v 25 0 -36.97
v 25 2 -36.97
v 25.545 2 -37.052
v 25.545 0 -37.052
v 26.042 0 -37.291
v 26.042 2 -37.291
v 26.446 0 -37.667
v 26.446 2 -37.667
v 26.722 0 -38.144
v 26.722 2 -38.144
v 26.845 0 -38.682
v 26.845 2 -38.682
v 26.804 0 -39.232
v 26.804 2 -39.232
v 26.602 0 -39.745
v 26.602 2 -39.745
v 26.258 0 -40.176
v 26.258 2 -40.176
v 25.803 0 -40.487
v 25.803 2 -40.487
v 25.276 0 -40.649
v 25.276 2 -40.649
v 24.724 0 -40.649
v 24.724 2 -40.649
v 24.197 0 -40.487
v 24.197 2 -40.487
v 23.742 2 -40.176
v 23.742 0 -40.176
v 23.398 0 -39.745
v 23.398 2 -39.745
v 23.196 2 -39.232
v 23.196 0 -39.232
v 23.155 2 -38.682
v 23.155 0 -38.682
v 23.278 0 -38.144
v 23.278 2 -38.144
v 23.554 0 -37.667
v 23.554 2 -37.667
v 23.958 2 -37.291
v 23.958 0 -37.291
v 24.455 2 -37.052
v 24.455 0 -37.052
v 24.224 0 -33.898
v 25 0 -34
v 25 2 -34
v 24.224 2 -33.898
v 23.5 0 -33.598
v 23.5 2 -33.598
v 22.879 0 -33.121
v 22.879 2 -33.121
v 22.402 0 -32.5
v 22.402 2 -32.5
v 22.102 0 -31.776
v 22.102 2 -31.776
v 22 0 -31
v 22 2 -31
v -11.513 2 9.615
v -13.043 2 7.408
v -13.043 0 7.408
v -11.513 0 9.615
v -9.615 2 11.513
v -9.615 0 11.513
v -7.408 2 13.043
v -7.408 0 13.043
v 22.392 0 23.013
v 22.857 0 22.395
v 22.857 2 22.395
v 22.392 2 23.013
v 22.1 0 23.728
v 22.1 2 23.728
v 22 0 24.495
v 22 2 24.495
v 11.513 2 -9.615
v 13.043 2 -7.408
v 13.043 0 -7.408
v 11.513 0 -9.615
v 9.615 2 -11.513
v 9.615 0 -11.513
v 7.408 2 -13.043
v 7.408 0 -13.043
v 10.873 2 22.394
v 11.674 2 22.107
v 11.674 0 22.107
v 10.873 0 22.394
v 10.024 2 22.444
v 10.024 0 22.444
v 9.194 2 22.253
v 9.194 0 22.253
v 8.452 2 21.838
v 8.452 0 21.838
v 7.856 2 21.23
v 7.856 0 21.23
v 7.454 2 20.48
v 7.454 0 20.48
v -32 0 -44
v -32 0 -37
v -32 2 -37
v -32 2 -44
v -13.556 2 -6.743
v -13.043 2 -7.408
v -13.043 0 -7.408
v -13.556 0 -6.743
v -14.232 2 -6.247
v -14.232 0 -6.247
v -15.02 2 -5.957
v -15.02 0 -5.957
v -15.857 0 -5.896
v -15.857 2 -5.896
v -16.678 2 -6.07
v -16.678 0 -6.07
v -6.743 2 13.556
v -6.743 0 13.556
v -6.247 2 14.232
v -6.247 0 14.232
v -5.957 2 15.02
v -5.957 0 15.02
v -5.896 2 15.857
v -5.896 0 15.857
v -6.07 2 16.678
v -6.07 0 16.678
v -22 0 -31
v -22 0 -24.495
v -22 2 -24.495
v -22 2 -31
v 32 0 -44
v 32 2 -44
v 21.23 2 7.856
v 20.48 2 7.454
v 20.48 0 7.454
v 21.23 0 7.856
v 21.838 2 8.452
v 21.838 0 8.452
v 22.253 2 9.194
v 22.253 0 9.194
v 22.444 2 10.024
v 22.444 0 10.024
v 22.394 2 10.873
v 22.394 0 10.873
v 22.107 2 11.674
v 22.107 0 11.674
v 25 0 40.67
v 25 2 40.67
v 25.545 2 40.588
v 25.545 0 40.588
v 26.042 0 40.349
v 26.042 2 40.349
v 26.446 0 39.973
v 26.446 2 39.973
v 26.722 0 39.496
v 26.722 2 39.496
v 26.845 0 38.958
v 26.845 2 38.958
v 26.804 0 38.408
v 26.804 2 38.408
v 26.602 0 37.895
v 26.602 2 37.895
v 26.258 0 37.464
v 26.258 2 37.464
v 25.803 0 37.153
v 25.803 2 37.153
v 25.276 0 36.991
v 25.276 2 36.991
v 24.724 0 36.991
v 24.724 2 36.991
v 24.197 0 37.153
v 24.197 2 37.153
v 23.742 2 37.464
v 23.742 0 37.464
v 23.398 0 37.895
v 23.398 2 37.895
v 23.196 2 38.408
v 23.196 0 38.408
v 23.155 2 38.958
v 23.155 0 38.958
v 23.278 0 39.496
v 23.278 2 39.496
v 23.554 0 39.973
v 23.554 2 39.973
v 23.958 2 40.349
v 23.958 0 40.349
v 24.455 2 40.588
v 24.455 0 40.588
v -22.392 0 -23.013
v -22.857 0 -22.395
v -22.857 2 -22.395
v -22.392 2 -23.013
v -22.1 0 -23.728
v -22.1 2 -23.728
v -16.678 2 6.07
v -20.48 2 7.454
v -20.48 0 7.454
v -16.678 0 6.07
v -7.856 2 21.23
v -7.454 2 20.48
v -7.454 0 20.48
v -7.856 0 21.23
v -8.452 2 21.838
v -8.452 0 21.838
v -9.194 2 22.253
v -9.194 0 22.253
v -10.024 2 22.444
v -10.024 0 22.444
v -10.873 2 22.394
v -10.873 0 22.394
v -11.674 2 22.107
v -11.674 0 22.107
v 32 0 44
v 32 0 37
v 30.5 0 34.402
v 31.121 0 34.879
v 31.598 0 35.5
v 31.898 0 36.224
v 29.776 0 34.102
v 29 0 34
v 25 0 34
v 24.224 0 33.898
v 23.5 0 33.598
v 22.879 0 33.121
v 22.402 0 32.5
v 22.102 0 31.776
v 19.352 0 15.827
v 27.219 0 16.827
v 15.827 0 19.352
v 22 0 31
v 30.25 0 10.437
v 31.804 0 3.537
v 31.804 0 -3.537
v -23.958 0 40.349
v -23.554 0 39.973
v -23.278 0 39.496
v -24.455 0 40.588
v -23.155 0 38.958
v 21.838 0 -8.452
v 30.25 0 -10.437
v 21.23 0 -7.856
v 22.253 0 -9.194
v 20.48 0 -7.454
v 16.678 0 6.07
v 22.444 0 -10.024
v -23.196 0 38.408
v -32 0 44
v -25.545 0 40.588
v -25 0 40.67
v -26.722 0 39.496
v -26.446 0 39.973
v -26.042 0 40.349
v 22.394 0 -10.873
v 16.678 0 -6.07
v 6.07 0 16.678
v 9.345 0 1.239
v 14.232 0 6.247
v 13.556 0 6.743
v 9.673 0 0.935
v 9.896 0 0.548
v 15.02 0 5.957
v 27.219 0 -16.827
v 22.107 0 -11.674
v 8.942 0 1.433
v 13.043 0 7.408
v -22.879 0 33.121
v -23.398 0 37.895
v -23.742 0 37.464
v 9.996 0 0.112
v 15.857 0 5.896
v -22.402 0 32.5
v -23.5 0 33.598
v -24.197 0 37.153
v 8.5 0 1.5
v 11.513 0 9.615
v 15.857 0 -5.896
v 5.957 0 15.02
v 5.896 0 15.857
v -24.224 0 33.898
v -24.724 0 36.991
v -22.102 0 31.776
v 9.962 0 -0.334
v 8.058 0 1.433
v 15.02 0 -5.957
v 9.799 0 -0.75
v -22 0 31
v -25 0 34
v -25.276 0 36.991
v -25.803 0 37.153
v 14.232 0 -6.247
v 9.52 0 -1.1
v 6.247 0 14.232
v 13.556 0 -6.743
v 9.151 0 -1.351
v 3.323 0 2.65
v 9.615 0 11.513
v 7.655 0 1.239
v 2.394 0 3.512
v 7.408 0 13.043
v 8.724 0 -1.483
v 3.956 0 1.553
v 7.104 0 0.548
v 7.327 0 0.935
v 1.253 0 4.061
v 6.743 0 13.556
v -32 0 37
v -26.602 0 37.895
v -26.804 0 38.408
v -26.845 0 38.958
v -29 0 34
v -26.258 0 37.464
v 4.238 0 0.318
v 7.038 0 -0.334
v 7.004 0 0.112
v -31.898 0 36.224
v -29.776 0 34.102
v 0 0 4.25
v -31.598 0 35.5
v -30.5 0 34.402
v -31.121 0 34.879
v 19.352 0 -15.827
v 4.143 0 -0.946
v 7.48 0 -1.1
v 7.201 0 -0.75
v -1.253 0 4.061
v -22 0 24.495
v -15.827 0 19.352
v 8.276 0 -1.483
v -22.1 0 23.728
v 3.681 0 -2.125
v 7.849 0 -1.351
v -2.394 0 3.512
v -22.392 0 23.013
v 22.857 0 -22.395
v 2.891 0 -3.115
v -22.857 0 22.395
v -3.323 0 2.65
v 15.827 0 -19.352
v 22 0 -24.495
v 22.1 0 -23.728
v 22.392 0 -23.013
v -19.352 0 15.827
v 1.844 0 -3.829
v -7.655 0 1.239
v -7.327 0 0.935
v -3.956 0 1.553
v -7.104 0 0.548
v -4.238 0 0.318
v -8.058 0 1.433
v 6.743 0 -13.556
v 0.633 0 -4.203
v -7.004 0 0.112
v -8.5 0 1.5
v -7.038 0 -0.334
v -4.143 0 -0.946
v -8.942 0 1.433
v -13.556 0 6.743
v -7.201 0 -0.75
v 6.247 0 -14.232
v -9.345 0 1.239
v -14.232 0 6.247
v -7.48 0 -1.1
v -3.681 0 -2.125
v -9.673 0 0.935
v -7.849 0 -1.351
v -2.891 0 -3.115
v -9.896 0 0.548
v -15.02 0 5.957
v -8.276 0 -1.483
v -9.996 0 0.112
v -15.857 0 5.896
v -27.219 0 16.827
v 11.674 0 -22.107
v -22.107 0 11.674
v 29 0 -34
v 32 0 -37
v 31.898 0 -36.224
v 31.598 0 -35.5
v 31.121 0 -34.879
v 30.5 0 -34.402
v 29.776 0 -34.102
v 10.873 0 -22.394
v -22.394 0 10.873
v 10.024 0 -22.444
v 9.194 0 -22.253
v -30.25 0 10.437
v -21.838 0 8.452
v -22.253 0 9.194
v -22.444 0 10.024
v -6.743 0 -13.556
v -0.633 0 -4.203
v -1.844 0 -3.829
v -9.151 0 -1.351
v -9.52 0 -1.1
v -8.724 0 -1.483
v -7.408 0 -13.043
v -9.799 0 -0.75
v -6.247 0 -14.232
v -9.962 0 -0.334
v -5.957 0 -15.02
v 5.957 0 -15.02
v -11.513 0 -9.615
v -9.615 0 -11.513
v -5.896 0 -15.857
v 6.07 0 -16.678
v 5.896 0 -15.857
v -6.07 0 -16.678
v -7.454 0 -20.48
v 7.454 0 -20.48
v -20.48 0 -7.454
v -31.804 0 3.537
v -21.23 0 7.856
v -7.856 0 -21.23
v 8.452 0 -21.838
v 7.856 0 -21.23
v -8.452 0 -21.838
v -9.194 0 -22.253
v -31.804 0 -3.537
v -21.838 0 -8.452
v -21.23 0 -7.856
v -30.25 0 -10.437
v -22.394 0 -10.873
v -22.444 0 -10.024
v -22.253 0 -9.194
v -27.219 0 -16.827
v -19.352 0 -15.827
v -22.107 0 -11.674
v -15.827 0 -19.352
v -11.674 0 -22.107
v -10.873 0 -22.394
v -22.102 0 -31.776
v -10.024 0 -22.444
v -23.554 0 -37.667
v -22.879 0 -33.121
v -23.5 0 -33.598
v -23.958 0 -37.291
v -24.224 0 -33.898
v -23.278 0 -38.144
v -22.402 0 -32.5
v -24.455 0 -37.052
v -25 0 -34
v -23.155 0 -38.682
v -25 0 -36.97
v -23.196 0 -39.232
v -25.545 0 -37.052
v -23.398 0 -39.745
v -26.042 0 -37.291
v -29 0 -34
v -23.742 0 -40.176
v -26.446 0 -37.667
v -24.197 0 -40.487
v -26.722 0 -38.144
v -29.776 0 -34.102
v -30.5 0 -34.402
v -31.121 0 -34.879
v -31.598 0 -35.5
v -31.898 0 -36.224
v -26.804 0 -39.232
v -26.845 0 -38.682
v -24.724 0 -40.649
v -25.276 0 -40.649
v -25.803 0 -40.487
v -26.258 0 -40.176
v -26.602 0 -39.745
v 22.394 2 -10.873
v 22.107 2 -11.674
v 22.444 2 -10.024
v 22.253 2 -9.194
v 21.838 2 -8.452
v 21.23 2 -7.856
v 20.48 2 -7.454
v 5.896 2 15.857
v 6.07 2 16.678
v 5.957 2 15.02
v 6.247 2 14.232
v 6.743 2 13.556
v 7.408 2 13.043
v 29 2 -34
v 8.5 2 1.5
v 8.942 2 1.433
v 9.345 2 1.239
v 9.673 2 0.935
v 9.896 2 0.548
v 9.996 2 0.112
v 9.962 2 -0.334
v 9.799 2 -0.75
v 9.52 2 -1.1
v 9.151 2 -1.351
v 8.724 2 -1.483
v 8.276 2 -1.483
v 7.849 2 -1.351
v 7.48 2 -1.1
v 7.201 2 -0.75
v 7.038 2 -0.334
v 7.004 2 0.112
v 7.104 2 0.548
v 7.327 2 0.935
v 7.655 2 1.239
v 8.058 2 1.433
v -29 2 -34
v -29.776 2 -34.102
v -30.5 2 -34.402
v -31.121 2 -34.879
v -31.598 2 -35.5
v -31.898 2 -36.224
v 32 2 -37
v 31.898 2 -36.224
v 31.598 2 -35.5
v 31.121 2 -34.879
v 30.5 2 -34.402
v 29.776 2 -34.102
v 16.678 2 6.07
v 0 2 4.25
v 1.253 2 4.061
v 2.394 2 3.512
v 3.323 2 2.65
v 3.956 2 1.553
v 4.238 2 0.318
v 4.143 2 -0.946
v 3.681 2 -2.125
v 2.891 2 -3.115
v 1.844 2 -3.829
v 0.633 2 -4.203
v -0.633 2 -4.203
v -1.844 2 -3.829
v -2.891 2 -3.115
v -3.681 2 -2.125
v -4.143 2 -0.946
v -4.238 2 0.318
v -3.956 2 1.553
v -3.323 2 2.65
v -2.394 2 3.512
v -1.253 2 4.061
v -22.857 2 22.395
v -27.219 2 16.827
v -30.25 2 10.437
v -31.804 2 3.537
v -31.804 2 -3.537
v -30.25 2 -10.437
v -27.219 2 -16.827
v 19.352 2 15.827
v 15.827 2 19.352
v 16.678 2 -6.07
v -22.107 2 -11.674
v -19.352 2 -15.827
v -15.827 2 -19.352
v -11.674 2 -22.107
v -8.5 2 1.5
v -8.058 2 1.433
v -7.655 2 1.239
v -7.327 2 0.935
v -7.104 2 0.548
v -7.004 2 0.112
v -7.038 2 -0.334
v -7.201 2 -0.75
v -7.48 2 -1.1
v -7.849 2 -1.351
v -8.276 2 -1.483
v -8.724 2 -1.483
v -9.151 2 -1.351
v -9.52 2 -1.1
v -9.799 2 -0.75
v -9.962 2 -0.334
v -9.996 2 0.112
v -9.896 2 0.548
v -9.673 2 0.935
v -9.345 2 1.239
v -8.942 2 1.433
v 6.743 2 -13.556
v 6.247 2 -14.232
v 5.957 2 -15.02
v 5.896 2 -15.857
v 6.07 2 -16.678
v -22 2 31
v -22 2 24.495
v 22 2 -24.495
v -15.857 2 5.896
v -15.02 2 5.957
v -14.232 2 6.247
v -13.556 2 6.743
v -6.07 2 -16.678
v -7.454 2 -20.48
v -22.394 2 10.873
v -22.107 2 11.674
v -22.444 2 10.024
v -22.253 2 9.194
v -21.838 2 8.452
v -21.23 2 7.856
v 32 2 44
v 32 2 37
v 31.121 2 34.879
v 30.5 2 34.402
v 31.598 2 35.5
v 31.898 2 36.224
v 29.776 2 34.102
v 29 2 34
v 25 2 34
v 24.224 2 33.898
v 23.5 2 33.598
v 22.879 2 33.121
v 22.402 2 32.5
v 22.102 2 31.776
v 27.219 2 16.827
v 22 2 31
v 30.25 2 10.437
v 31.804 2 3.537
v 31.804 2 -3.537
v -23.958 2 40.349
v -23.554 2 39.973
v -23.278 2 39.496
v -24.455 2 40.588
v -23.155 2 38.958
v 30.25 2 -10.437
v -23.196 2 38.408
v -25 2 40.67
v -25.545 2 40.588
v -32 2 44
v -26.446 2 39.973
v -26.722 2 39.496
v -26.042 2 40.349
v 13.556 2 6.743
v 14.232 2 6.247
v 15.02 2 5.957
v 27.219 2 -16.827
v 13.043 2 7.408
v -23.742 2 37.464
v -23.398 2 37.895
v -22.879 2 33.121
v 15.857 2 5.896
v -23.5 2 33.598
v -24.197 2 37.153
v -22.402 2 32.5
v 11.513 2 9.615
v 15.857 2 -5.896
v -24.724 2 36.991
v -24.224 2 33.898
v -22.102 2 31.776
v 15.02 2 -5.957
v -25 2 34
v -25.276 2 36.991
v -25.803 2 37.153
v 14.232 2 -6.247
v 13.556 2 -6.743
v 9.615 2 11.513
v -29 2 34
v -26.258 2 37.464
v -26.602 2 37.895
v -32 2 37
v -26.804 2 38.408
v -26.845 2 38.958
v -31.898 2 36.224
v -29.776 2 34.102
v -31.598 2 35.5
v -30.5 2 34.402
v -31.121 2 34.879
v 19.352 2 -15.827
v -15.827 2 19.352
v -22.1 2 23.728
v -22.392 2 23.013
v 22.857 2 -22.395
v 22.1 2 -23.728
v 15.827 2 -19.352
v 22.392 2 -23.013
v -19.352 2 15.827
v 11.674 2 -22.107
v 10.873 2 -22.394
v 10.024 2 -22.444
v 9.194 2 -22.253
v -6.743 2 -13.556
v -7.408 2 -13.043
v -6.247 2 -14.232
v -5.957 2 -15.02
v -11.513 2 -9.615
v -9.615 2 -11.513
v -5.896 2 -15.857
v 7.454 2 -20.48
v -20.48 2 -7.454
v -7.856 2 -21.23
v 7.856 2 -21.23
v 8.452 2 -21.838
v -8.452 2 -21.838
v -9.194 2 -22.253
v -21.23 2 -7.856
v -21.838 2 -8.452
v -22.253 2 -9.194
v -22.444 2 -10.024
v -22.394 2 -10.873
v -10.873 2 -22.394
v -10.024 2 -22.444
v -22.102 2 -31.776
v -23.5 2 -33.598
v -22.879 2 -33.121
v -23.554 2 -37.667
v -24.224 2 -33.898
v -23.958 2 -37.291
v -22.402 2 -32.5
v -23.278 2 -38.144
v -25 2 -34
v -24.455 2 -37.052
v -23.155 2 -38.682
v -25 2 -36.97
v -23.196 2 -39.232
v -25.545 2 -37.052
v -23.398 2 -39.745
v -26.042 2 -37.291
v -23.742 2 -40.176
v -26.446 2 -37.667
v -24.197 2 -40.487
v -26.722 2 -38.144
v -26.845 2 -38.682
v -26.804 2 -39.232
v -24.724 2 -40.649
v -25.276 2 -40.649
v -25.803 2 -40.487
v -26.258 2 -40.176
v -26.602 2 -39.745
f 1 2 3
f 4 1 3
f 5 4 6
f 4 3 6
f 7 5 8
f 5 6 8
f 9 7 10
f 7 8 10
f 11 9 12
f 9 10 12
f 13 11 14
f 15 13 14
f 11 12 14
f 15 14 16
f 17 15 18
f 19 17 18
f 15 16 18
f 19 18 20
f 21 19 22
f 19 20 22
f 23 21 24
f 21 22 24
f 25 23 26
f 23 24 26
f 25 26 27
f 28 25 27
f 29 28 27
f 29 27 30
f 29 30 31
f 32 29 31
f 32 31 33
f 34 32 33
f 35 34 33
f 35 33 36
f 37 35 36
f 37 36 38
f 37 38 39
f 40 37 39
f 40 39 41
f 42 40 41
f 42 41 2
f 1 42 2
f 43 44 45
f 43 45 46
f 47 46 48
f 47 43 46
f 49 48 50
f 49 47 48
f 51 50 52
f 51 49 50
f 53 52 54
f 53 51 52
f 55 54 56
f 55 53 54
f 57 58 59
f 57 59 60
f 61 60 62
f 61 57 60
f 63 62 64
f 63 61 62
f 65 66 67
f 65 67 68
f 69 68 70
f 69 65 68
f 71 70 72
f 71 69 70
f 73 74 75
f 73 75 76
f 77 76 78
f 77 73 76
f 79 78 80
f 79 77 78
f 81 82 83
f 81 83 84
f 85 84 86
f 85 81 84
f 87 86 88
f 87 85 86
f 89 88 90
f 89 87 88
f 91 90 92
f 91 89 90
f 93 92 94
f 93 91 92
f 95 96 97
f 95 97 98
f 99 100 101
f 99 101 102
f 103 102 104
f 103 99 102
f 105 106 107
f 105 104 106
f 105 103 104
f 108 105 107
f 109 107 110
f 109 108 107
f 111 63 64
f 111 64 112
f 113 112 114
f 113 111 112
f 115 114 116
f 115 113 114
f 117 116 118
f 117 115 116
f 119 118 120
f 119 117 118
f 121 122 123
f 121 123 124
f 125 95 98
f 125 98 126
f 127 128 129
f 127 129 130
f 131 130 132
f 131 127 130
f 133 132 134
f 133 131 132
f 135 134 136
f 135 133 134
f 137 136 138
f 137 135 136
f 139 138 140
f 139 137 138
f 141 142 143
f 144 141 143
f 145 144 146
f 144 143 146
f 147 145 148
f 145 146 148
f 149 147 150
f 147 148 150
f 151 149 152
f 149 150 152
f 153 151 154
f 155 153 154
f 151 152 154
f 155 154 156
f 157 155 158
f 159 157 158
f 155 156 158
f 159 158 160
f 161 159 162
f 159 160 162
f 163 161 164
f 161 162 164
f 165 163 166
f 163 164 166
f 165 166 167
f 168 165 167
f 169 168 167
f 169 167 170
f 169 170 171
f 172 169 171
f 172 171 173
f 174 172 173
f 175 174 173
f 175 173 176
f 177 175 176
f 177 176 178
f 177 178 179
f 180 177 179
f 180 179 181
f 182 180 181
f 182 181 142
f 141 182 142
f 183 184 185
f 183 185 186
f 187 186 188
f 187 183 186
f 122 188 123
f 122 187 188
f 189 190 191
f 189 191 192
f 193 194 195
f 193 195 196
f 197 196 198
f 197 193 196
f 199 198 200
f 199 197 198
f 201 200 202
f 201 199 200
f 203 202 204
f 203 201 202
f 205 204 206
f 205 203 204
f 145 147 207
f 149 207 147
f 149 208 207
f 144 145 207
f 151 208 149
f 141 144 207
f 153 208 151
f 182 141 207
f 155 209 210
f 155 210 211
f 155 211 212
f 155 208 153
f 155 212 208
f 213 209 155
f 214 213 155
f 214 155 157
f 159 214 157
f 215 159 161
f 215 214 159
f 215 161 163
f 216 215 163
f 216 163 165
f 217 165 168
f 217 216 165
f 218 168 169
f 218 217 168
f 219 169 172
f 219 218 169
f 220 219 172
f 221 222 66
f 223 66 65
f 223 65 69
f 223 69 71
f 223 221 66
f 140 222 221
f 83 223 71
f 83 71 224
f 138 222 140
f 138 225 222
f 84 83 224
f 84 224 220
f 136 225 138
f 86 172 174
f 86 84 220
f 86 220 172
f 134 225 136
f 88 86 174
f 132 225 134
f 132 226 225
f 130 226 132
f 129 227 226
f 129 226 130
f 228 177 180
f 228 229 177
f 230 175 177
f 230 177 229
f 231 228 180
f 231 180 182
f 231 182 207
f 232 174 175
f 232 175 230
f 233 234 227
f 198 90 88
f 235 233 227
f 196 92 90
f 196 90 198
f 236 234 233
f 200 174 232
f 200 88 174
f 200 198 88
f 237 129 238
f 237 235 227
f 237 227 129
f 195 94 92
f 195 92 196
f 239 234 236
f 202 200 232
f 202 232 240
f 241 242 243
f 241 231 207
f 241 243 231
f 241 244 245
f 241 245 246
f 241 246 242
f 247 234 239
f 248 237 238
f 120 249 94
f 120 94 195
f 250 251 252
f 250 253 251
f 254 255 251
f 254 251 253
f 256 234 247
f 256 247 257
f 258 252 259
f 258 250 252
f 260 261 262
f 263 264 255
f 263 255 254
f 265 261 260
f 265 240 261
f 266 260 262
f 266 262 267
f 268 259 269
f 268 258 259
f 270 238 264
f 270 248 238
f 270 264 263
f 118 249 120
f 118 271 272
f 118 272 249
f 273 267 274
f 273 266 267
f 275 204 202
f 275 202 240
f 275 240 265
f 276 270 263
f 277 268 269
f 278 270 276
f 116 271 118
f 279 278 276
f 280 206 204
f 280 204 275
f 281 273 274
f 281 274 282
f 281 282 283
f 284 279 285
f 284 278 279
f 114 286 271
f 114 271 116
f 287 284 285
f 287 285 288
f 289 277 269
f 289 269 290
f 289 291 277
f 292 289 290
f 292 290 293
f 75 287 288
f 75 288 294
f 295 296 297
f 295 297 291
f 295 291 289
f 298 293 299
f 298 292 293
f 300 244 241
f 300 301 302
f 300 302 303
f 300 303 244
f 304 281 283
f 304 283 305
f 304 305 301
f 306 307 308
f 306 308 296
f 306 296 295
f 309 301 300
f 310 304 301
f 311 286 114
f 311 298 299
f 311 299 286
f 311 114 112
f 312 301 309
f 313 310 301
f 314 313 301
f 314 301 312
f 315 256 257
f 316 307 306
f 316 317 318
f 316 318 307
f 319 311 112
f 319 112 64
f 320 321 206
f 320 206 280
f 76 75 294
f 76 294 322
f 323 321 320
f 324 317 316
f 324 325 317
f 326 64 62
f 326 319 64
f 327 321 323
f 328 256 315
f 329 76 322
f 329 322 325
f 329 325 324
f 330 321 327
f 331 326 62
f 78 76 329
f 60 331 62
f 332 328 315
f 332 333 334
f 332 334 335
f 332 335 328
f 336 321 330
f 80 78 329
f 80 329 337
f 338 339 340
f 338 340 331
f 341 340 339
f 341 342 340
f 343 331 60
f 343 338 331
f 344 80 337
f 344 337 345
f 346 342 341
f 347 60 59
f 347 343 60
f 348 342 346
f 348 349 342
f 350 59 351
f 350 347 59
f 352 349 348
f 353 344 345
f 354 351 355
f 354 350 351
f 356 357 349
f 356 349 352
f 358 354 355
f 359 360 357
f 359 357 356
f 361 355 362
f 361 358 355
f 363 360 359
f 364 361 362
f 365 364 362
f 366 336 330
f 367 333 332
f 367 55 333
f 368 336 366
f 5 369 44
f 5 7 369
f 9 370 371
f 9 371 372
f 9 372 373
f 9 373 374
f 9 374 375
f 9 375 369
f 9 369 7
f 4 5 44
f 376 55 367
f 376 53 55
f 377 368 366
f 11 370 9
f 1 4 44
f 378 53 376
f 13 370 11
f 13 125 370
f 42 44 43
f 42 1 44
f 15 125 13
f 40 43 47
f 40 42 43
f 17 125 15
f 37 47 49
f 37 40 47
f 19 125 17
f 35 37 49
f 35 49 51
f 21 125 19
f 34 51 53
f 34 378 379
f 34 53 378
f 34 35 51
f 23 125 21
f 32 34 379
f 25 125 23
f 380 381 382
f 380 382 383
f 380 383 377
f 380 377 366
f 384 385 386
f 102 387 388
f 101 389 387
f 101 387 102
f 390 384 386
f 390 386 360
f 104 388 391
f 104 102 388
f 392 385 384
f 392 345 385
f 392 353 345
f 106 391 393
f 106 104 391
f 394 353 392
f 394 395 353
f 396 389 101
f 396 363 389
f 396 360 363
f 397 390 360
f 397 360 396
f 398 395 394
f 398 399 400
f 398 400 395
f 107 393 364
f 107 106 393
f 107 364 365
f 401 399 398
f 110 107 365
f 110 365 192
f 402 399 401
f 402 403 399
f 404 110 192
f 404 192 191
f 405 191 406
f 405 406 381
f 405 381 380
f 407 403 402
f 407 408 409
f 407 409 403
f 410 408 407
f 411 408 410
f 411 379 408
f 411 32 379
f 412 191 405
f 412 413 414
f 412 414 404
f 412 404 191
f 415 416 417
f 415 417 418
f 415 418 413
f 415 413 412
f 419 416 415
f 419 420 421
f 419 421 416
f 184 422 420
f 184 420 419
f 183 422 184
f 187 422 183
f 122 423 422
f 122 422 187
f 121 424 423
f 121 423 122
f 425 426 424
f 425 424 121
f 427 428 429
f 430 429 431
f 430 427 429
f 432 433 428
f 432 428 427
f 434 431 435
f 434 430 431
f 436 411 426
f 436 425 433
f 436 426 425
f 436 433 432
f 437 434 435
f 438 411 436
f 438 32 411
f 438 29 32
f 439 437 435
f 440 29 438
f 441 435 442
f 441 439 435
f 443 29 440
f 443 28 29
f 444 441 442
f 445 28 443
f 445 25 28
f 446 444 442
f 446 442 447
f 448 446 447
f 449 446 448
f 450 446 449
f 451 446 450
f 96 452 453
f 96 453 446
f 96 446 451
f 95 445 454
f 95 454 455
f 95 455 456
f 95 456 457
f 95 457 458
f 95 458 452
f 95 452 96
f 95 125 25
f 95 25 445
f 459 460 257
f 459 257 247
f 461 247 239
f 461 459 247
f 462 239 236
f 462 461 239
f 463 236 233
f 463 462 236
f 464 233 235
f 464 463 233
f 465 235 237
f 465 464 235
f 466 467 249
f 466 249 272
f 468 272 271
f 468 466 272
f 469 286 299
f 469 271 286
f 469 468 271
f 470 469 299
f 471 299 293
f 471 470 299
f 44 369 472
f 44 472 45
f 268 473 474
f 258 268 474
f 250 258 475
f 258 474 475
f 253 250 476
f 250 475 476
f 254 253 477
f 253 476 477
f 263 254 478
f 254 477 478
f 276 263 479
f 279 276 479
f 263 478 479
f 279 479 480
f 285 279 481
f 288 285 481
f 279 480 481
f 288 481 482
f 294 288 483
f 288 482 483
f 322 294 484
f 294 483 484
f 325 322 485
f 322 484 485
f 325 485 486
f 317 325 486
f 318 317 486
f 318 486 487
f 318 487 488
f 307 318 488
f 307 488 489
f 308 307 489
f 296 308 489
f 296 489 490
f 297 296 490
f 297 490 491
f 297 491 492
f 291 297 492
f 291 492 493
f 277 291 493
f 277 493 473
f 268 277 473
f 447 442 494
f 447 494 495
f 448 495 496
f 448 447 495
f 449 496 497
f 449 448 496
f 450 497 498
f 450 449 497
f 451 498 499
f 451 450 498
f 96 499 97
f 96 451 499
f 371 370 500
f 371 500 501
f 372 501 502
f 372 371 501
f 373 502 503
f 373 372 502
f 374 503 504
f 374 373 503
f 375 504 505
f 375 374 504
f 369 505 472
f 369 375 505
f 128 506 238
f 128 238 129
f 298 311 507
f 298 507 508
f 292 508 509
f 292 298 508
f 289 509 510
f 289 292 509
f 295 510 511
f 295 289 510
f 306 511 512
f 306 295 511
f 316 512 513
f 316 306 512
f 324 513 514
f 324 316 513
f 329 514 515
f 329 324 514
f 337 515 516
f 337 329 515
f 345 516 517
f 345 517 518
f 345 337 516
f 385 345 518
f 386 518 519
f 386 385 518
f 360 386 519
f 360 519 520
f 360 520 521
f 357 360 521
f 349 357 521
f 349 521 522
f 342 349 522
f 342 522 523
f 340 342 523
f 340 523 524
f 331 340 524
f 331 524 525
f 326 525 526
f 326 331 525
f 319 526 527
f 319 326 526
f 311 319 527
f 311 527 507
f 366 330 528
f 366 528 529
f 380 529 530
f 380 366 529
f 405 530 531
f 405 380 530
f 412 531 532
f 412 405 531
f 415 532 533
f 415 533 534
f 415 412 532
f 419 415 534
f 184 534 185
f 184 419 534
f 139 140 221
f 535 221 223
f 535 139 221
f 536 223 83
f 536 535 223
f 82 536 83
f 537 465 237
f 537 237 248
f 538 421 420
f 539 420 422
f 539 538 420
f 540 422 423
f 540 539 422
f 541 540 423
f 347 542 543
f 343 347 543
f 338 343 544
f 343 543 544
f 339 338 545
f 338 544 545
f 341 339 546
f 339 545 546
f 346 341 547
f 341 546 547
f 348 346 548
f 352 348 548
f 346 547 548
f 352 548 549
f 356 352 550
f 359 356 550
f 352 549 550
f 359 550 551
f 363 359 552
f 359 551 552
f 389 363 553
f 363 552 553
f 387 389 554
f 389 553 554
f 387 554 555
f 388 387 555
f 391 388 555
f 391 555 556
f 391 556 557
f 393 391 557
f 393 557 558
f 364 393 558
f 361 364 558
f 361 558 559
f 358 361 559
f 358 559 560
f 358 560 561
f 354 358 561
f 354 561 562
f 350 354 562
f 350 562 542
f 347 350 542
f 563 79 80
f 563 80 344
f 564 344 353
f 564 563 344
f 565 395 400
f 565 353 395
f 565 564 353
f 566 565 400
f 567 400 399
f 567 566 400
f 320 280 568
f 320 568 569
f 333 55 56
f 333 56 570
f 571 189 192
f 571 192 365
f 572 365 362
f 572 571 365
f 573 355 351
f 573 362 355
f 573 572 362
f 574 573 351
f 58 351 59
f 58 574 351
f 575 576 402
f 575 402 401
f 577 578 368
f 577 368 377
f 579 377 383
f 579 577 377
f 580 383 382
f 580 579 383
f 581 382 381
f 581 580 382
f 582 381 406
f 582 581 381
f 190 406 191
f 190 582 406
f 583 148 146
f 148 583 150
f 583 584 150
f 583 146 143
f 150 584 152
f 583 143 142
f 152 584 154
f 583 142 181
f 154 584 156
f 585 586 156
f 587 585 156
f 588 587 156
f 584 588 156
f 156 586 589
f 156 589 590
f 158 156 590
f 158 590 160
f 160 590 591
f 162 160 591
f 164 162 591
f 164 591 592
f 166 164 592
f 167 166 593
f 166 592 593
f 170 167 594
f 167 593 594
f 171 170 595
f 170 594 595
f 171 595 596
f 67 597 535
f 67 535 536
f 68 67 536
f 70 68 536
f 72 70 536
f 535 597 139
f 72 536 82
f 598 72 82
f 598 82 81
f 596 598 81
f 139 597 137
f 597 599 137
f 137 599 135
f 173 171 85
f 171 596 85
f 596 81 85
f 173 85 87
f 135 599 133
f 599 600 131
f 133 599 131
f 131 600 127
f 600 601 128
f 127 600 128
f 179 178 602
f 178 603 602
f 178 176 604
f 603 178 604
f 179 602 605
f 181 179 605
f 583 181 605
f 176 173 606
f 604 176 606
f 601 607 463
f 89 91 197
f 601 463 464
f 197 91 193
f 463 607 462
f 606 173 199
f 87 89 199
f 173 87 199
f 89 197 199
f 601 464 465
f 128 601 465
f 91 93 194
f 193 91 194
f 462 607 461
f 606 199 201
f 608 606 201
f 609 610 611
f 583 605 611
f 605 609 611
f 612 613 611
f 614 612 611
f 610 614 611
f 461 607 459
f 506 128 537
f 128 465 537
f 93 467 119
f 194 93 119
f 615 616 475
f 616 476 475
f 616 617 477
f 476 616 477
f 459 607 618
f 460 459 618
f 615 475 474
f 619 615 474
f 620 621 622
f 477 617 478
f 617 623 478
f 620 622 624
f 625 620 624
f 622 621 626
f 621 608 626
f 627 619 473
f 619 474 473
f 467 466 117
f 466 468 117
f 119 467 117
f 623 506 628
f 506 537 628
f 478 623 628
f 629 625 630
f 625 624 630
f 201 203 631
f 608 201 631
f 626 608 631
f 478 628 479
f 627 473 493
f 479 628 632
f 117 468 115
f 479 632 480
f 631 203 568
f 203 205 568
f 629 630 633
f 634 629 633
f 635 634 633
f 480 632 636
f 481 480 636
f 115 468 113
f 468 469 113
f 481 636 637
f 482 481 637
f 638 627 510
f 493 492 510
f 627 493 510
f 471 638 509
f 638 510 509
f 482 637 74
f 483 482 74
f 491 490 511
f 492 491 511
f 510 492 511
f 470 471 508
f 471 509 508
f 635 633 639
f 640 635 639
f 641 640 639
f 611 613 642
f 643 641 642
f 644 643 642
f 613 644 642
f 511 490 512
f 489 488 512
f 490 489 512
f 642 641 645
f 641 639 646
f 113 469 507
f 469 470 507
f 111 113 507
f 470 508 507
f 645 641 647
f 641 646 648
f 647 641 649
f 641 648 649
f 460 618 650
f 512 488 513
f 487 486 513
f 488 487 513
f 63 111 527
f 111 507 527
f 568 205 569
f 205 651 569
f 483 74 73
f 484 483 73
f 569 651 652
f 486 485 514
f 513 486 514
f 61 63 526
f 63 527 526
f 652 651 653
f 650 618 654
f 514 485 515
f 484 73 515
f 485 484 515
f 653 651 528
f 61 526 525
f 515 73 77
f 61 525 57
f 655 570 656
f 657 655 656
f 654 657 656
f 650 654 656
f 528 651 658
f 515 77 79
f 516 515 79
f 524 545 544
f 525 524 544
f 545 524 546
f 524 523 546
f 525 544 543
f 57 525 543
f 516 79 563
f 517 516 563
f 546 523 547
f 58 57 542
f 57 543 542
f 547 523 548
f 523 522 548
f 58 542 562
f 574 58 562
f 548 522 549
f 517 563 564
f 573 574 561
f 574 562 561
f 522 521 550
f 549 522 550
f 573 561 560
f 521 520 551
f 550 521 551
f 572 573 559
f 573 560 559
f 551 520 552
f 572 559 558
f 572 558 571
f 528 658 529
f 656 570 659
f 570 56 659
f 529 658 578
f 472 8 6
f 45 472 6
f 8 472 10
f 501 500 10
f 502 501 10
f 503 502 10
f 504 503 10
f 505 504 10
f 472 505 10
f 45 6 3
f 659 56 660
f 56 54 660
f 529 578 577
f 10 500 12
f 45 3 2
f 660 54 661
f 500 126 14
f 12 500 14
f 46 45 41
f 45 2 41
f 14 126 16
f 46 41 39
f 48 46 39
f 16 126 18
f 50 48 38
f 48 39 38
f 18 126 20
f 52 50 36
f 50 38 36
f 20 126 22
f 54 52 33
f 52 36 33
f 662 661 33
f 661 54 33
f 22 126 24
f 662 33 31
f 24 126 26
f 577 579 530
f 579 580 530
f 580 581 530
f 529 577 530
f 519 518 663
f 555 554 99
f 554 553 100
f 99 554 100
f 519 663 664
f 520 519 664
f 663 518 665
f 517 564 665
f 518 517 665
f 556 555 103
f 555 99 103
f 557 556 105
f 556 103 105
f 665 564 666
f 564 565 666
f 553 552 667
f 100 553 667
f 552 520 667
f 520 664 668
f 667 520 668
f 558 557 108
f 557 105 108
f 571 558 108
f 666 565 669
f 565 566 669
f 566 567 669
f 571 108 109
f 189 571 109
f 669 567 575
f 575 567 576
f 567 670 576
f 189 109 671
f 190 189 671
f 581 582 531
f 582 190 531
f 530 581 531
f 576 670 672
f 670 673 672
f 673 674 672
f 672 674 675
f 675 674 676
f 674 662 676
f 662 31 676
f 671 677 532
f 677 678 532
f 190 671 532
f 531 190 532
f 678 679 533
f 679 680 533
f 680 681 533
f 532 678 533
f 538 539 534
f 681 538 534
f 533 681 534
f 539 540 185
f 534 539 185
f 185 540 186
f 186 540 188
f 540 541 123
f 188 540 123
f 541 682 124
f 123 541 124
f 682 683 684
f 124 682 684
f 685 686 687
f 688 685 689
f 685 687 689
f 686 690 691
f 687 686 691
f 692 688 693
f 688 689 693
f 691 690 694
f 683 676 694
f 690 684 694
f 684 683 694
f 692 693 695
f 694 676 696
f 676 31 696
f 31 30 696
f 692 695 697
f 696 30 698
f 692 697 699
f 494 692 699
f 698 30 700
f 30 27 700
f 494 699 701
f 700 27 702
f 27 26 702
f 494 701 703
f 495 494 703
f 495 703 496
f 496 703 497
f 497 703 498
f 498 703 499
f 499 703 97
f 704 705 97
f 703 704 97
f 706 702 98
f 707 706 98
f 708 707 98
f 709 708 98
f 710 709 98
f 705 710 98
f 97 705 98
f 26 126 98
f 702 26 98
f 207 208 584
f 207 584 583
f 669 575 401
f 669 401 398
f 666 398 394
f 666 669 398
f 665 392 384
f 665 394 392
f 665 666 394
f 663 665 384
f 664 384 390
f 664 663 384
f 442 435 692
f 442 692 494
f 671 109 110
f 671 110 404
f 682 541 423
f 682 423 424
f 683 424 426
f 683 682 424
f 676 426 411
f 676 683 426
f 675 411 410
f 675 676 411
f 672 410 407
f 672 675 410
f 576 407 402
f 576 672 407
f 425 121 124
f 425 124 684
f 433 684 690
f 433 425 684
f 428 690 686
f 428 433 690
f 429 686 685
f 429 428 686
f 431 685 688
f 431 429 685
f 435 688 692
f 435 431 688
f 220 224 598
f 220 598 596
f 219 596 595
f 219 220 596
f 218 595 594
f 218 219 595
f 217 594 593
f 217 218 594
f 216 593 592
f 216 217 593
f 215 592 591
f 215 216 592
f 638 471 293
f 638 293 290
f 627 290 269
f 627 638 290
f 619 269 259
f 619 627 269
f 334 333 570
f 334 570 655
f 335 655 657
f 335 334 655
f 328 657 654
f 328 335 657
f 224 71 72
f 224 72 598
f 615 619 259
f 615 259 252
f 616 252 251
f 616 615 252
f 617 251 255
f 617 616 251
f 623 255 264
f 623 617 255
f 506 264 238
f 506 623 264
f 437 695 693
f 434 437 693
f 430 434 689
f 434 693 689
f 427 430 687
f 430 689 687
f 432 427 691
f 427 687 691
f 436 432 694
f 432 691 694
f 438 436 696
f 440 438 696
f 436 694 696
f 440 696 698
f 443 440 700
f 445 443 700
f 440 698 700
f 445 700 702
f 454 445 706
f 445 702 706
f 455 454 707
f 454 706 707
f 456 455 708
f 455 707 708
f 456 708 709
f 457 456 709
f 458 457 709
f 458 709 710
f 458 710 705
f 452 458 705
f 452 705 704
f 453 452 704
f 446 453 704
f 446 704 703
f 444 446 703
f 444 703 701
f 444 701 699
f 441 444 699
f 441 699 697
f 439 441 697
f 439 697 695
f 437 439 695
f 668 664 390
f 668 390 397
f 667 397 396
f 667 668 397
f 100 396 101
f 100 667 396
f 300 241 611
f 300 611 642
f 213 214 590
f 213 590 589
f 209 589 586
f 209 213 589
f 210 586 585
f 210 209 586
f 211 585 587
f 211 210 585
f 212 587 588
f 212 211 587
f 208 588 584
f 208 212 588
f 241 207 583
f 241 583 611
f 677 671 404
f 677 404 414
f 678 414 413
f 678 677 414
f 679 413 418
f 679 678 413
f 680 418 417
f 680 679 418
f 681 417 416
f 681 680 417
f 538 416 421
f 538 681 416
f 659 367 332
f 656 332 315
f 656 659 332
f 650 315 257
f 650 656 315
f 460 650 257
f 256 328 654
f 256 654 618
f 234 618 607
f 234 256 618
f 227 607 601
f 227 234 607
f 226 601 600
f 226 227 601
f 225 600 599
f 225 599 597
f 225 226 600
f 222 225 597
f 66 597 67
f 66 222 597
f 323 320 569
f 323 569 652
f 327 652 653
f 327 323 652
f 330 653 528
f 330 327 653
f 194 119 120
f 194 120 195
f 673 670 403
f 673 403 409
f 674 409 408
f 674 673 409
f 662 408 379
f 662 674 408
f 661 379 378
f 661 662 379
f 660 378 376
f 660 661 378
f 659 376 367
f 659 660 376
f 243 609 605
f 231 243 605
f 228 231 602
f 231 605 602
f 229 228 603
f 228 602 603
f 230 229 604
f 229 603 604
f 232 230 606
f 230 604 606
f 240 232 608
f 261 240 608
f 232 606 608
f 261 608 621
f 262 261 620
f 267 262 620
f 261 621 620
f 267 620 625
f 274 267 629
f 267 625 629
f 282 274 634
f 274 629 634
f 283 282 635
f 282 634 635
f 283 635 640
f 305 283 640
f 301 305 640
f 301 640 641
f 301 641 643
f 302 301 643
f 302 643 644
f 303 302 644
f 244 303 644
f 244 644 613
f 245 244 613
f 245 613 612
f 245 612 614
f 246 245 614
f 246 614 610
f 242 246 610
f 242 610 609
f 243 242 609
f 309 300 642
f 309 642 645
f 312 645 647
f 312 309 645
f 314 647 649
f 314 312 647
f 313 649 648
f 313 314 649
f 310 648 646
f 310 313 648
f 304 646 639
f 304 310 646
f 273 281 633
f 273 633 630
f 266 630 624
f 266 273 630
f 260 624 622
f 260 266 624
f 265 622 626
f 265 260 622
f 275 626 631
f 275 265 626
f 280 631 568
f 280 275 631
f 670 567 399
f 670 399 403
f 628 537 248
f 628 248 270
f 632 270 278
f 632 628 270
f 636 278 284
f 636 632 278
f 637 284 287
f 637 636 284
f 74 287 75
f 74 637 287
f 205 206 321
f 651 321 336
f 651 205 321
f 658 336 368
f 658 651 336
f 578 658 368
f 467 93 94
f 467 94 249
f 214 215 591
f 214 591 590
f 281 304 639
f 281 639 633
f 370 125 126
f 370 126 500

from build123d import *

# Parameters (mm, degrees)
SKETCH1_R           = 4.25
BOSS_EXTRUDE1_DEPTH = 2
CUT_EXTRUDE1_DEPTH  = 5
CIRPATTERN1_COUNT   = 4
SKETCH3_R           = 1.5
CUT_EXTRUDE2_DEPTH  = 5
SKETCH5_R           = 1.85
CUT_EXTRUDE3_DEPTH  = 5


with BuildPart() as part:
    # Sketch1 → Boss-Extrude1 (new body)
    with BuildSketch(Plane(origin=(0, 0, 0), x_dir=(1, 0, 0), z_dir=(0, 1, 0))):
        with BuildLine():
            Line((-29, -34), (-25, -34))
            ThreePointArc((-25, -34), (-22.878679656, -33.121320344), (-22, -31))
            Line((-22, -31), (-22, -24.494897428))
            ThreePointArc((-22, -24.494897428), (-22.222539701, -23.361004009), (-22.857142857, -22.395334791))
            ThreePointArc((-22.857142857, -22.395334791), (-32, 0), (-22.857142857, 22.395334791))
            ThreePointArc((-22.857142857, 22.395334791), (-22.222539701, 23.361004009), (-22, 24.494897428))
            Line((-22, 24.494897428), (-22, 31))
            ThreePointArc((-22, 31), (-22.878679656, 33.121320344), (-25, 34))
            Line((-25, 34), (-29, 34))
            ThreePointArc((-29, 34), (-31.121320344, 34.878679656), (-32, 37))
            Line((-32, 37), (-32, 44))
            Line((-32, 44), (32, 44))
            Line((32, 44), (32, 37))
            ThreePointArc((32, 37), (31.121320344, 34.878679656), (29, 34))
            Line((29, 34), (25, 34))
            ThreePointArc((25, 34), (22.878679656, 33.121320344), (22, 31))
            Line((22, 31), (22, 24.494897428))
            ThreePointArc((22, 24.494897428), (22.222539701, 23.361004009), (22.857142857, 22.395334791))
            ThreePointArc((22.857142857, 22.395334791), (32, 0), (22.857142857, -22.395334791))
            ThreePointArc((22.857142857, -22.395334791), (22.222539701, -23.361004009), (22, -24.494897428))
            Line((22, -24.494897428), (22, -31))
            ThreePointArc((22, -31), (22.878679656, -33.121320344), (25, -34))
            Line((25, -34), (29, -34))
            ThreePointArc((29, -34), (31.121320344, -34.878679656), (32, -37))
            Line((32, -37), (32, -44))
            Line((32, -44), (-32, -44))
            Line((-32, -44), (-32, -37))
            ThreePointArc((-32, -37), (-31.121320344, -34.878679656), (-29, -34))
        make_face()
        with Locations(Location((0, 0, 0), (0, 0, 270))):
            Circle(SKETCH1_R, mode=Mode.SUBTRACT)
    extrude(amount=BOSS_EXTRUDE1_DEPTH)

    # Sketch2 → Cut-Extrude1 (cut)
    with BuildSketch(Plane(origin=(0, 2, 0), x_dir=(1, 0, 0), z_dir=(0, 1, 0))):
        with BuildLine():
            ThreePointArc((-11.674129624, 22.106892534), (-9.194159134, 22.25327912), (-7.454156207, 20.48012586))
            Line((-7.454156207, 20.48012586), (-6.070255366, 16.677889548))
            ThreePointArc((-6.070255366, 16.677889548), (-6.073907786, 14.615788781), (-7.40777769, 13.043190932))
            ThreePointArc((-7.40777769, 13.043190932), (-10.606601718, 10.606601718), (-13.043190932, 7.40777769))
            ThreePointArc((-13.043190932, 7.40777769), (-14.615788781, 6.073907786), (-16.677889548, 6.070255366))
            Line((-16.677889548, 6.070255366), (-20.48012586, 7.454156207))
            ThreePointArc((-20.48012586, 7.454156207), (-22.25327912, 9.194159134), (-22.106892534, 11.674129624))
            ThreePointArc((-22.106892534, 11.674129624), (-17.67766953, 17.67766953), (-11.674129624, 22.106892534))
        make_face()
    cut_extrude1 = extrude(amount=-CUT_EXTRUDE1_DEPTH, mode=Mode.SUBTRACT)

    # CirPattern1: Cut-Extrude1 ×4 about axis
    cirpattern1_axis = Axis((0, 0, 0), (0, 1, 0))
    for i in range(1, CIRPATTERN1_COUNT):
        add(cut_extrude1.rotate(cirpattern1_axis, i * 360 / CIRPATTERN1_COUNT), mode=Mode.SUBTRACT)

    # Sketch3 → Cut-Extrude2 (cut)
    with BuildSketch(Plane(origin=(0, 2, 0), x_dir=(1, 0, 0), z_dir=(0, 1, 0))):
        with Locations(Location((-8.5, 0, 0), (0, 0, 270))):
            Circle(SKETCH3_R)
        with Locations(Location((8.5, 0, 0), (0, 0, 270))):
            Circle(SKETCH3_R)
    extrude(amount=-CUT_EXTRUDE2_DEPTH, mode=Mode.SUBTRACT)

    # Sketch5 → Cut-Extrude3 (cut)
    with BuildSketch(Plane(origin=(0, 2, 0), x_dir=(1, 0, 0), z_dir=(0, 1, 0))):
        with Locations(Location((25, 38.82, 0), (0, 0, 270))):
            Circle(SKETCH5_R)
        with Locations(Location((-25, 38.82, 0), (0, 0, 270))):
            Circle(SKETCH5_R)
        with Locations(Location((-25, -38.82, 0), (0, 0, 270))):
            Circle(SKETCH5_R)
        with Locations(Location((25, -38.82, 0), (0, 0, 270))):
            Circle(SKETCH5_R)
    extrude(amount=-CUT_EXTRUDE3_DEPTH, mode=Mode.SUBTRACT)


solid = part.part
